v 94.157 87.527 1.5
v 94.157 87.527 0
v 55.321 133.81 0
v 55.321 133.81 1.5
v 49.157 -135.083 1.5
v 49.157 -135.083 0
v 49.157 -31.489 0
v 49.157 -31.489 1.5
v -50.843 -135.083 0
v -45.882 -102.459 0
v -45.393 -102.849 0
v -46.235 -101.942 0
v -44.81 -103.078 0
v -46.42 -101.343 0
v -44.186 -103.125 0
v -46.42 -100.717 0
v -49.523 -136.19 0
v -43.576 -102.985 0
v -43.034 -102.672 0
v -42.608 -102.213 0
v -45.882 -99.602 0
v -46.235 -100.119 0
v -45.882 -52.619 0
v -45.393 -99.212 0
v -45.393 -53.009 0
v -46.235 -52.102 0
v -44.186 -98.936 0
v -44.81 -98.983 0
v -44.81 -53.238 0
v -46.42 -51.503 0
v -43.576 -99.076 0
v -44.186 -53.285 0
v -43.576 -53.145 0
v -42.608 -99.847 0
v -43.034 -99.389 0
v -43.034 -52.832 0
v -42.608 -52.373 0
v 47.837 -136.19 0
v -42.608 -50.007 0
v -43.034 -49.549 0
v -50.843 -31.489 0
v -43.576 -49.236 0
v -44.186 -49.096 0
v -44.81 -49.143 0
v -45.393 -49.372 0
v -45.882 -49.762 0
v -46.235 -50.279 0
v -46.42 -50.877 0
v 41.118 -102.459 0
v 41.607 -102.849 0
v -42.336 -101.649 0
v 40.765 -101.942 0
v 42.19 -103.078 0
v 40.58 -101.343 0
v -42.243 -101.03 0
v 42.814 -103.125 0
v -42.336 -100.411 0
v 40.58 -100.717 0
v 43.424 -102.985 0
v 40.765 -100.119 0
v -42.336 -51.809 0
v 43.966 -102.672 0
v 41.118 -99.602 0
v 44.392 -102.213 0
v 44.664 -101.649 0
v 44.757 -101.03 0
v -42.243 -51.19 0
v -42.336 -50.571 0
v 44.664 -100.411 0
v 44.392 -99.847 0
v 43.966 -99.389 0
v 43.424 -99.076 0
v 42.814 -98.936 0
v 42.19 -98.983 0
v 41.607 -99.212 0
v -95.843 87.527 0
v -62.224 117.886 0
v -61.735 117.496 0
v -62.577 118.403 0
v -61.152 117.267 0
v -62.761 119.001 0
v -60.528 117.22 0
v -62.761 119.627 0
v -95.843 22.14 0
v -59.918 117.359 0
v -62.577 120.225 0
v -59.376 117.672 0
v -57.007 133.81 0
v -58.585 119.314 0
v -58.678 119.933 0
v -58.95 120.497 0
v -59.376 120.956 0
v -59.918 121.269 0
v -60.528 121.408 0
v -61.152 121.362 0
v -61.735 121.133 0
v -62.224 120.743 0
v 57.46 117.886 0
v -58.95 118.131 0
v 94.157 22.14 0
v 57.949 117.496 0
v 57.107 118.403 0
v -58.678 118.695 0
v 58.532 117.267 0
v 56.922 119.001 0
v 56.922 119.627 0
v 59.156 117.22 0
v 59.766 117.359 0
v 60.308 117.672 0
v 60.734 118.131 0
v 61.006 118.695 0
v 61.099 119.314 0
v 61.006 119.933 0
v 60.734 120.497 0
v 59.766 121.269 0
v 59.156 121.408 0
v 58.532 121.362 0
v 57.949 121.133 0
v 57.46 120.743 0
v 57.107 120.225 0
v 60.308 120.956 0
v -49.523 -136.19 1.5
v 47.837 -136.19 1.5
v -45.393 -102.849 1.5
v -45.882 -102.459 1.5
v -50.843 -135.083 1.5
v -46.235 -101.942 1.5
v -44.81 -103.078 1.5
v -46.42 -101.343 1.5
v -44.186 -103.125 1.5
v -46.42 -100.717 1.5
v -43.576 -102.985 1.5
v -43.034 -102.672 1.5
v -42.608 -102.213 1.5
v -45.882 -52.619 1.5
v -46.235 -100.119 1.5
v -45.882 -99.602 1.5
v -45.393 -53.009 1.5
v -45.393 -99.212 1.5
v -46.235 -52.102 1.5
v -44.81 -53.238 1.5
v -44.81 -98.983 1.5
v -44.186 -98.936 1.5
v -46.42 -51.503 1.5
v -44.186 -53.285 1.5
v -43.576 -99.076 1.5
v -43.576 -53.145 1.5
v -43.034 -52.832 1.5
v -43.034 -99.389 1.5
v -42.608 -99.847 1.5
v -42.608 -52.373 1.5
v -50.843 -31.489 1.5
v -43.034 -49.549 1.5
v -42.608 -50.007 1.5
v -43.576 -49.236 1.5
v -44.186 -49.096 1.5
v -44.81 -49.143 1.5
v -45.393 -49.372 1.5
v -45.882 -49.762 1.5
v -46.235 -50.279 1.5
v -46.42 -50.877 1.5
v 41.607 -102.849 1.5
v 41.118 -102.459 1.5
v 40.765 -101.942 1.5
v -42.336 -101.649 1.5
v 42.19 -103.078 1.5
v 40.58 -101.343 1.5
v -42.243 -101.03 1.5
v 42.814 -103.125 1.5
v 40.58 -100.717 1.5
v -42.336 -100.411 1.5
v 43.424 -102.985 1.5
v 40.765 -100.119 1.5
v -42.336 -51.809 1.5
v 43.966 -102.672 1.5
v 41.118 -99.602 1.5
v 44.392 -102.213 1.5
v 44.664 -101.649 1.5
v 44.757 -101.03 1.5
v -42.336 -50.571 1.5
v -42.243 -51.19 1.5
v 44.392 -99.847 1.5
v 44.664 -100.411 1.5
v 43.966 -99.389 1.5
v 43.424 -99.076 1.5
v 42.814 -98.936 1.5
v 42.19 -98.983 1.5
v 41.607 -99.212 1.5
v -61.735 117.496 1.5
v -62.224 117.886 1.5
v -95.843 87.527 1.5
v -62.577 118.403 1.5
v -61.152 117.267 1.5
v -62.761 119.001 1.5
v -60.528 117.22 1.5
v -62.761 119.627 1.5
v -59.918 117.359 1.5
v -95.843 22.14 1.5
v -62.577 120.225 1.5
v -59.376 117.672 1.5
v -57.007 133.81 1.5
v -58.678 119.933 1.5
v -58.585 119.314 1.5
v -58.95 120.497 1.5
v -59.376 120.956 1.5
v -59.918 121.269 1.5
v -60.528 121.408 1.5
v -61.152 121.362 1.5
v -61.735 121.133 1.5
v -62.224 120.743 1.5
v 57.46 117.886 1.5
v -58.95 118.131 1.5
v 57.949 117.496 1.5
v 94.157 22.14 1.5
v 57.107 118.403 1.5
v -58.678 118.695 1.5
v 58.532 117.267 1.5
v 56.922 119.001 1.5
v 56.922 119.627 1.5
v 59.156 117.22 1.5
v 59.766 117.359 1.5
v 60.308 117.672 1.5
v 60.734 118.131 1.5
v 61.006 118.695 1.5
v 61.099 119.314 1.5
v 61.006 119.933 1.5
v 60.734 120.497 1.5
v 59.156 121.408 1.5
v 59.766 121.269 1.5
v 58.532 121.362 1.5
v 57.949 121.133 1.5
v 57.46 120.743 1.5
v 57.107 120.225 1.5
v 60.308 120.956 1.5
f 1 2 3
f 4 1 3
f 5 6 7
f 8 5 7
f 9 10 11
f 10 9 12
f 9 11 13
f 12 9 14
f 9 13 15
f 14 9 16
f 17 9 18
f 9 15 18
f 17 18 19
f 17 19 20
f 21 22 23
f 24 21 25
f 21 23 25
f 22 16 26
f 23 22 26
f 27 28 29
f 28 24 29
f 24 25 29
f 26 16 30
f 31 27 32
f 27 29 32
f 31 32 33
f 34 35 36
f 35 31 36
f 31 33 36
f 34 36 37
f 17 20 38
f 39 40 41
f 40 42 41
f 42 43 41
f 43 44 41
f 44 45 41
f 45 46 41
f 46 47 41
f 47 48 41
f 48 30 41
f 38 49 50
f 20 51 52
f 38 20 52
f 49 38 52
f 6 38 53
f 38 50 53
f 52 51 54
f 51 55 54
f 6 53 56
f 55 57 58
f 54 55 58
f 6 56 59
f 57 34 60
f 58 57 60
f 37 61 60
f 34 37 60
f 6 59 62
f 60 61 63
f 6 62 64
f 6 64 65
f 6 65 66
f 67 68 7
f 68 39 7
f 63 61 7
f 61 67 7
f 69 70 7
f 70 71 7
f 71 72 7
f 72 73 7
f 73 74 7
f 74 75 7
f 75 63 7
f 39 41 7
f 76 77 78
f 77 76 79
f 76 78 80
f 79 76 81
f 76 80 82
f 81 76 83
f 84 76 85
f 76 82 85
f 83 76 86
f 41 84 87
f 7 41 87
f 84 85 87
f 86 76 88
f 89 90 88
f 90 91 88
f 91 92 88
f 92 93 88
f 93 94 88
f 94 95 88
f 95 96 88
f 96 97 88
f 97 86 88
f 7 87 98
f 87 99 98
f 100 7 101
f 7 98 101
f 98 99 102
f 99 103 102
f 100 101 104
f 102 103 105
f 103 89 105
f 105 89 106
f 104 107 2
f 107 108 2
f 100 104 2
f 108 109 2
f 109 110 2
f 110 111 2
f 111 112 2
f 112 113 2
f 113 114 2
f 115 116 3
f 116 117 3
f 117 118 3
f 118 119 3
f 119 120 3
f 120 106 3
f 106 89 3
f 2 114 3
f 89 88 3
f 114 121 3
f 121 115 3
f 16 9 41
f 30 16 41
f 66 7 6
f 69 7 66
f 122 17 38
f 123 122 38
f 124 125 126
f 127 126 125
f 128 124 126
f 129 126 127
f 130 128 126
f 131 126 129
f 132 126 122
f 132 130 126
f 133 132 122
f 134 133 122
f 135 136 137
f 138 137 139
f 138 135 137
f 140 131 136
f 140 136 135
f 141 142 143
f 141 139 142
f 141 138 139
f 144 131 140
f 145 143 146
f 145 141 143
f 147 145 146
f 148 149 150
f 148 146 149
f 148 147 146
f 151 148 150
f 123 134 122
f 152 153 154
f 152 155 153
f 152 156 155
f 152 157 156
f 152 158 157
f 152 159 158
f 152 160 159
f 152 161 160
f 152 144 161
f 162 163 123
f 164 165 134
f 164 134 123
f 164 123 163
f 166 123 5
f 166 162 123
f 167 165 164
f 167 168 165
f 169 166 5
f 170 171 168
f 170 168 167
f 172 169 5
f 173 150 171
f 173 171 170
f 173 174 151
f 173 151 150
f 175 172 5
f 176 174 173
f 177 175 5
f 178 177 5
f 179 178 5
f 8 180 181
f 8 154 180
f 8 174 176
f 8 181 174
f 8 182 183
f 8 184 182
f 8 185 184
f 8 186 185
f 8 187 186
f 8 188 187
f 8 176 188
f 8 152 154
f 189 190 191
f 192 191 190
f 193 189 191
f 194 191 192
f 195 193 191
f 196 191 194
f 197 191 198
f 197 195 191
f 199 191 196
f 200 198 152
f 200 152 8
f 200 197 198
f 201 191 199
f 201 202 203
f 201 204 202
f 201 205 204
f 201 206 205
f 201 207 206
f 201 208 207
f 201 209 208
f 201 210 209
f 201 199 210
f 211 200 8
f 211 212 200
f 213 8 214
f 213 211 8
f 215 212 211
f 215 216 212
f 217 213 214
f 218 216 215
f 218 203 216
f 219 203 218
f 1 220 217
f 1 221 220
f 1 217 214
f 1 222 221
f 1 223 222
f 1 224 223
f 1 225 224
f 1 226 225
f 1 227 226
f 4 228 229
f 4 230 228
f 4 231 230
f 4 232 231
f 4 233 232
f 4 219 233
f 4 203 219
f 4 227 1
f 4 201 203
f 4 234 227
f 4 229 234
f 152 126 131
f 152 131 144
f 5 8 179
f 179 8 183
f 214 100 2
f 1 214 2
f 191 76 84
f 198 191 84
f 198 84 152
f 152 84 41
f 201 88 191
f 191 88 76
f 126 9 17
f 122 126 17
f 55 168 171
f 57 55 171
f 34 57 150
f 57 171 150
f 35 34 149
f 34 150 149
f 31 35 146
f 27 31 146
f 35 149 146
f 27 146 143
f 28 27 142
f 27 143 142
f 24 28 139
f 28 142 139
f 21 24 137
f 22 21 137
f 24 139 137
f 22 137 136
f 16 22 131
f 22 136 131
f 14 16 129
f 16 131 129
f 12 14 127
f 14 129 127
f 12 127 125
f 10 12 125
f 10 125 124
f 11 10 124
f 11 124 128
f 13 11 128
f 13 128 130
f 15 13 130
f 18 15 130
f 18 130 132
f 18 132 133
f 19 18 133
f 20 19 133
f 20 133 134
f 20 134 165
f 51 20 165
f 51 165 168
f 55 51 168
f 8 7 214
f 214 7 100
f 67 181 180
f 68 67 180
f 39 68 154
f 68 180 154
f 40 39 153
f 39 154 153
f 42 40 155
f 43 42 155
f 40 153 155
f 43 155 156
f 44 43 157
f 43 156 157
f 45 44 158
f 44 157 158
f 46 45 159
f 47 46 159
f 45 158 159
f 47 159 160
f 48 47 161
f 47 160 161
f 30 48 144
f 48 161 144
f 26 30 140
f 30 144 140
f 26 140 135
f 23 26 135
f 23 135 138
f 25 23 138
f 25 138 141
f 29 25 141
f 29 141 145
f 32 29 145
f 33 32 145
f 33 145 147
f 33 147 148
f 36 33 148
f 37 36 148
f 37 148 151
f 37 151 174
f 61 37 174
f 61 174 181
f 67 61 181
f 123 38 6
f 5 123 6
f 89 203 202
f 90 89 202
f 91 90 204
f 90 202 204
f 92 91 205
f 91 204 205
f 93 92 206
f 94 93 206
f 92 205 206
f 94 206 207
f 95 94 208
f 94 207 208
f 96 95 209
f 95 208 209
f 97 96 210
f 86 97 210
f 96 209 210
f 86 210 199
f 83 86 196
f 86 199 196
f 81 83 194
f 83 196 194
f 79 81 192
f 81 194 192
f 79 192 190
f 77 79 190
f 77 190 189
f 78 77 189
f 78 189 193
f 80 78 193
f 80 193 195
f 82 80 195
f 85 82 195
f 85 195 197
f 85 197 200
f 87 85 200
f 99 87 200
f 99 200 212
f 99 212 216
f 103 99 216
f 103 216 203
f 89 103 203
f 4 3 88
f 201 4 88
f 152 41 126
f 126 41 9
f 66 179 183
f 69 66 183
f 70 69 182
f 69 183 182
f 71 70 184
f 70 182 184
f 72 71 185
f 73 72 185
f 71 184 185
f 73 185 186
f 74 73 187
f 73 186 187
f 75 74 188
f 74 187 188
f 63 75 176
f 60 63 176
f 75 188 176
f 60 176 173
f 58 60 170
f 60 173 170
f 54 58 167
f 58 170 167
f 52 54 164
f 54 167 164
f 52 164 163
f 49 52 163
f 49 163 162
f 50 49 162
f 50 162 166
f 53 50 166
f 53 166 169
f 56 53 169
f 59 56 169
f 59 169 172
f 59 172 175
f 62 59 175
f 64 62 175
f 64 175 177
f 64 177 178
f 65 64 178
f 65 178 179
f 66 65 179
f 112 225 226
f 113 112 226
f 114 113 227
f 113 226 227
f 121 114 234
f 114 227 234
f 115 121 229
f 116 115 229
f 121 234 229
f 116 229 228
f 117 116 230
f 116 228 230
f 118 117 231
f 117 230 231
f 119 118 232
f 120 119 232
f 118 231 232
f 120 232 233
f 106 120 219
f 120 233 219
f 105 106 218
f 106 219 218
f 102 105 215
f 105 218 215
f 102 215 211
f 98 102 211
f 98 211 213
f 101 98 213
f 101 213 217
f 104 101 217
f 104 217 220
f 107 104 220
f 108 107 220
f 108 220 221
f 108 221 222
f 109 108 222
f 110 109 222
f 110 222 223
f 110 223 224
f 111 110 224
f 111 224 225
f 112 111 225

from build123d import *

# Parameters (mm, degrees)
RESSALTO_EXTRUS_O1_DEPTH = 1.5
CORTE_EXTRUS_O1_REACH    = 3.5
ESBO_O2_R                = 2.1


with BuildPart() as part:
    # Esboço1 → Ressalto-extrusão1 (new body)
    with BuildSketch(Plane.XY):
        Polygon((55.321046002, 133.809611411), (-57.006999458, 133.809611411), (-95.842976728, 87.526695978), (-95.842976728, 22.140182404), (-50.842976728, -31.488729263), (-50.842976728, -135.082673958), (-49.522853837, -136.190388589), (47.836900381, -136.190388589), (49.157023272, -135.082673958), (49.157023272, -31.488729263), (94.157023272, 22.140182404), (94.157023272, 87.526695978), align=None)
    extrude(amount=RESSALTO_EXTRUS_O1_DEPTH)

    # Esboço2 → Corte-extrusão1 (cut, up to next)
    with BuildSketch(Plane.XY.offset(1.5), mode=Mode.PRIVATE) as corte_extrus_o1_sk1:
        with Locations((-60.684933322, 119.314215641)):
            Circle(ESBO_O2_R)
    corte_extrus_o1_tool1 = extrude(corte_extrus_o1_sk1.sketch, amount=-CORTE_EXTRUS_O1_REACH, mode=Mode.PRIVATE) & part.part
    add(corte_extrus_o1_tool1.solids().sort_by_distance((-60.684933, 119.314216, 1.5))[0], mode=Mode.SUBTRACT)
    # Esboço2 → Corte-extrusão1 (cut, up to next)
    with BuildSketch(Plane.XY.offset(1.5), mode=Mode.PRIVATE) as corte_extrus_o1_sk2:
        with Locations((-44.342976728, -101.030388589)):
            Circle(ESBO_O2_R)
    corte_extrus_o1_tool2 = extrude(corte_extrus_o1_sk2.sketch, amount=-CORTE_EXTRUS_O1_REACH, mode=Mode.PRIVATE) & part.part
    add(corte_extrus_o1_tool2.solids().sort_by_distance((-44.342977, -101.030389, 1.5))[0], mode=Mode.SUBTRACT)
    # Esboço2 → Corte-extrusão1 (cut, up to next)
    with BuildSketch(Plane.XY.offset(1.5), mode=Mode.PRIVATE) as corte_extrus_o1_sk3:
        with Locations((42.657023272, -101.030388589)):
            Circle(ESBO_O2_R)
    corte_extrus_o1_tool3 = extrude(corte_extrus_o1_sk3.sketch, amount=-CORTE_EXTRUS_O1_REACH, mode=Mode.PRIVATE) & part.part
    add(corte_extrus_o1_tool3.solids().sort_by_distance((42.657023, -101.030389, 1.5))[0], mode=Mode.SUBTRACT)
    # Esboço2 → Corte-extrusão1 (cut, up to next)
    with BuildSketch(Plane.XY.offset(1.5), mode=Mode.PRIVATE) as corte_extrus_o1_sk4:
        with Locations((58.998979866, 119.314215641)):
            Circle(ESBO_O2_R)
    corte_extrus_o1_tool4 = extrude(corte_extrus_o1_sk4.sketch, amount=-CORTE_EXTRUS_O1_REACH, mode=Mode.PRIVATE) & part.part
    add(corte_extrus_o1_tool4.solids().sort_by_distance((58.99898, 119.314216, 1.5))[0], mode=Mode.SUBTRACT)
    # Esboço2 → Corte-extrusão1 (cut, up to next)
    with BuildSketch(Plane.XY.offset(1.5), mode=Mode.PRIVATE) as corte_extrus_o1_sk5:
        with Locations((-44.342976728, -51.190388589)):
            Circle(ESBO_O2_R)
    corte_extrus_o1_tool5 = extrude(corte_extrus_o1_sk5.sketch, amount=-CORTE_EXTRUS_O1_REACH, mode=Mode.PRIVATE) & part.part
    add(corte_extrus_o1_tool5.solids().sort_by_distance((-44.342977, -51.190389, 1.5))[0], mode=Mode.SUBTRACT)


solid = part.part
